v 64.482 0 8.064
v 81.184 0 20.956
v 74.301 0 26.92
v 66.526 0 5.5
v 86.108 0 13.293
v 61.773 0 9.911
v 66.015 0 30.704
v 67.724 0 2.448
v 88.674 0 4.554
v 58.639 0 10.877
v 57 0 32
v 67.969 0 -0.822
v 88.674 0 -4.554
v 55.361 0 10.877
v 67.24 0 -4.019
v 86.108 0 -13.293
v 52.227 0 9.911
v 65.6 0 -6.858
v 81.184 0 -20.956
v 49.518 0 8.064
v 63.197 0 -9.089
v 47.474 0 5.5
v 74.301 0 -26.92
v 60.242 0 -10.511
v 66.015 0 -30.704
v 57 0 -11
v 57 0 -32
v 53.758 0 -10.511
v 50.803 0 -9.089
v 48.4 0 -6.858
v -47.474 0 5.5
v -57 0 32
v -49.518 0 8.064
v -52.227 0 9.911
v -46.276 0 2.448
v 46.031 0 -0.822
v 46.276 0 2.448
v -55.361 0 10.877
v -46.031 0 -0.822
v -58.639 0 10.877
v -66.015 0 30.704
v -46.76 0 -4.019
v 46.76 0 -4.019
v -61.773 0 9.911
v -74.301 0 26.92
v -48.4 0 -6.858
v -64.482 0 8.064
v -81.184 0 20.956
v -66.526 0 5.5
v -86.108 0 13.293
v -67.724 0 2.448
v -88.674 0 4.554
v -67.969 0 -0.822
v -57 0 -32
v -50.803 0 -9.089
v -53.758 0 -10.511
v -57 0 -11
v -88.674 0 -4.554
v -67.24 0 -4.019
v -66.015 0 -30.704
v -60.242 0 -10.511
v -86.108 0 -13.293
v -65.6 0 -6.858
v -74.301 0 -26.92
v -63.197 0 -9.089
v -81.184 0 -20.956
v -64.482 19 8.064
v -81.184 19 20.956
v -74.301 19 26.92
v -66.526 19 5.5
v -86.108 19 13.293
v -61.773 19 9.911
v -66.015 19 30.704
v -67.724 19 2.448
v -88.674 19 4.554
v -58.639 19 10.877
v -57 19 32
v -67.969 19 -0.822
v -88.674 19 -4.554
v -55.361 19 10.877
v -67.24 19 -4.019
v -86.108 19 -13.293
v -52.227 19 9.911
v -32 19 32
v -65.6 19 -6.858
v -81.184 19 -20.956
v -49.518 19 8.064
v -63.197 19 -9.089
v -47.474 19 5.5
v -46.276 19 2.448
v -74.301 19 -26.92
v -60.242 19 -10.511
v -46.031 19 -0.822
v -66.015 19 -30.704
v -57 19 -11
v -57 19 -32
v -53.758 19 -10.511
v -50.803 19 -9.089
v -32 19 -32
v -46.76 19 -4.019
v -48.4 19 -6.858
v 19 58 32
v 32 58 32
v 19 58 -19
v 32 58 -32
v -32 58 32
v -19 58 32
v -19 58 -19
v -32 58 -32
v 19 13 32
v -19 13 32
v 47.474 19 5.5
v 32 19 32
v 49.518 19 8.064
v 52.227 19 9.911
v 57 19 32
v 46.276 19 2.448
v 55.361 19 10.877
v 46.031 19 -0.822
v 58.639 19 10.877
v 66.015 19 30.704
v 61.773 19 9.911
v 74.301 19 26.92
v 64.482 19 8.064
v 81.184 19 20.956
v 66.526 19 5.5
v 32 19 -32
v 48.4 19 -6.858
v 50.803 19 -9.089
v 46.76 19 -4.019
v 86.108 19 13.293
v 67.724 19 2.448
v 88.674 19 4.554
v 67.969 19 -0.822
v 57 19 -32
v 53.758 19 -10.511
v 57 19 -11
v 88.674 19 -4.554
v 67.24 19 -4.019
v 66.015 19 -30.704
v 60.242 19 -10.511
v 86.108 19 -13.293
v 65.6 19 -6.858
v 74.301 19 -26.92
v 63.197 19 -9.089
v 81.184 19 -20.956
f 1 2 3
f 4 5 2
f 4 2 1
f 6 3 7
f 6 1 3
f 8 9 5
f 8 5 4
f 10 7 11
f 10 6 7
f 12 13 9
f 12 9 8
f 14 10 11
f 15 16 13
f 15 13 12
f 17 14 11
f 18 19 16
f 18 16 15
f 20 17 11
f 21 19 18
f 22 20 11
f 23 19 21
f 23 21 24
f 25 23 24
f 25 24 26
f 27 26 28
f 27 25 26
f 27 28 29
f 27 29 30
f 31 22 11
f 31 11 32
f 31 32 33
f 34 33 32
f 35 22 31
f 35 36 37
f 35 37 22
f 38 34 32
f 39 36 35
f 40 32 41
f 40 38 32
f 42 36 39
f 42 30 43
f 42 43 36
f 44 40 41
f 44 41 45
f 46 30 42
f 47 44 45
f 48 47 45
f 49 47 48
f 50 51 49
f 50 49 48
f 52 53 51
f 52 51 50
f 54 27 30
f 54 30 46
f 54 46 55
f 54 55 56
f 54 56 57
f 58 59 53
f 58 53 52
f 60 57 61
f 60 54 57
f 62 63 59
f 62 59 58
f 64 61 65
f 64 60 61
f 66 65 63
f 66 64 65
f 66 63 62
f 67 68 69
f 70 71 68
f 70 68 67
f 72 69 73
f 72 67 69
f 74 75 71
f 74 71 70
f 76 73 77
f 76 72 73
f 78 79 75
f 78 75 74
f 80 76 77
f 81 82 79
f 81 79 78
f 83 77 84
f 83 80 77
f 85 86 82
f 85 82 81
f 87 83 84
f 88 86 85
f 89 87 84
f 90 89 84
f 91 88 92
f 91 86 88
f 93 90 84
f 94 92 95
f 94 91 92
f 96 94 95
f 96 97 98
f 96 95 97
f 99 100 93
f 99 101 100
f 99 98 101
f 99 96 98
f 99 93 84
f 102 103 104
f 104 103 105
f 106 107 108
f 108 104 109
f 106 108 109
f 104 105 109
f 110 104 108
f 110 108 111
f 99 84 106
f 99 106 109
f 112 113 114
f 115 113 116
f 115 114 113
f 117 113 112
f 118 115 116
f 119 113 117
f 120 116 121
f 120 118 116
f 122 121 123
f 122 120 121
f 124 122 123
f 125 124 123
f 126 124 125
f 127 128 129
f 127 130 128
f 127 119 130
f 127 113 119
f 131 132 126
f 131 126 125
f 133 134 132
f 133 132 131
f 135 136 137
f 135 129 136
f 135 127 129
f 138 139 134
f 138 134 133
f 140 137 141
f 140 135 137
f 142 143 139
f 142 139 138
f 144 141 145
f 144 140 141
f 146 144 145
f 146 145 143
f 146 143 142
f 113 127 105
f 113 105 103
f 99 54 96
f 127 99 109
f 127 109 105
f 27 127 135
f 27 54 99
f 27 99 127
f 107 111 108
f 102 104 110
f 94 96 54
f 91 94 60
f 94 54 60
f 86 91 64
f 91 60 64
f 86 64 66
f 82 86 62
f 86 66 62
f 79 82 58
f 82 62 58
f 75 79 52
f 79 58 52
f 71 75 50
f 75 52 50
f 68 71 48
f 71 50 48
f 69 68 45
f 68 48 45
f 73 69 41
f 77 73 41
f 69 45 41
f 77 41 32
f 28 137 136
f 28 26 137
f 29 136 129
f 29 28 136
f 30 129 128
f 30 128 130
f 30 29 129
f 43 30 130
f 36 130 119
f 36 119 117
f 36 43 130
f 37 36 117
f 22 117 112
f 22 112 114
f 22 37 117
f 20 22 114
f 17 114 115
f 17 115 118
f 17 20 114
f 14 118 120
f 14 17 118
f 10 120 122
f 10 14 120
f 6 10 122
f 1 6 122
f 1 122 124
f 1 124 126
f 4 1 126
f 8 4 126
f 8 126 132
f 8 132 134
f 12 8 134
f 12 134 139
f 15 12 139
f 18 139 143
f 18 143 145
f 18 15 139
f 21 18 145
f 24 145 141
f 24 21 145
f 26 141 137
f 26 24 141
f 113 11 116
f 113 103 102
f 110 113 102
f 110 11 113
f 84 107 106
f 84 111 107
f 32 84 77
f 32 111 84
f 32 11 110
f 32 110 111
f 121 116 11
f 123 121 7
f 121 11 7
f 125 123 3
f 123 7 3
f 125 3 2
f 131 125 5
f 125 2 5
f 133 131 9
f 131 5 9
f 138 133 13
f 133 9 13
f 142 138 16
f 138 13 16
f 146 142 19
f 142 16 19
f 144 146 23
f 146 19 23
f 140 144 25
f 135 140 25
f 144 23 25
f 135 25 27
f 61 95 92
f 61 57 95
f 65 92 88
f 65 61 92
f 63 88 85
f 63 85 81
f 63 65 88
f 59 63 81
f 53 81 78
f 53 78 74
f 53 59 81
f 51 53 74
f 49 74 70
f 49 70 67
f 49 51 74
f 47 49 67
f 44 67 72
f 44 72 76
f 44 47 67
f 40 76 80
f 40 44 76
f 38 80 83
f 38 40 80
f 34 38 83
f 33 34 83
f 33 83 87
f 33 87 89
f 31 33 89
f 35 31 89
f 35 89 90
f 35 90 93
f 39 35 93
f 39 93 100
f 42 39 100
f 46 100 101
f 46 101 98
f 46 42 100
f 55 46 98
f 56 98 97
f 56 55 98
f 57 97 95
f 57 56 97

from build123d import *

# Parameters (mm, degrees)
SKETCH1_R               = 11
BOSS_EXTRUDE1_DEPTH     = 13
SKETCH2_W               = 38
SKETCH2_H               = 51
BOSS_EXTRUDE3_DEPTH     = 45
CUT_EXTRUDE1_DEPTH      = 127.696487718
CUT_EXTRUDE1_DEPTH_BACK = 127.696487718
SKETCH4_R               = 11
BOSS_EXTRUDE4_DEPTH     = 6
BOSS_EXTRUDE5_DEPTH     = 39


with BuildPart() as part:
    # Sketch1 → Boss-Extrude1 (new body)
    with BuildSketch(Plane(origin=(0, 0, 0), x_dir=(1, 0, 0), z_dir=(0, 1, 0))):
        with BuildLine():
            Line((-57, 32), (57, 32))
            ThreePointArc((57, 32), (89, 0), (57, -32))
            Line((57, -32), (-57, -32))
            ThreePointArc((-57, -32), (-89, 0), (-57, 32))
        make_face()
        with Locations(Location((-57, 0, 0), (0, 0, 90))):
            Circle(SKETCH1_R, mode=Mode.SUBTRACT)
        with Locations(Location((57, 0, 0), (0, 0, 90))):
            Circle(SKETCH1_R, mode=Mode.SUBTRACT)
    extrude(amount=BOSS_EXTRUDE1_DEPTH)

    # Sketch2 → Boss-Extrude3 (add)
    with BuildSketch(Plane(origin=(0, 13, 0), x_dir=(1, 0, 0), z_dir=(0, 1, 0))):
        with Locations((0, -6.5)):
            Rectangle(SKETCH2_W, SKETCH2_H)
    extrude(amount=BOSS_EXTRUDE3_DEPTH)

    # Sketch3 → Cut-Extrude1 (cut, two sides: drawn at the far end of the back side and taken through both)
    with BuildSketch(Plane.ZY.offset(19).offset(-CUT_EXTRUDE1_DEPTH_BACK)):
        Polygon((-143.828237157, 168.142562197), (-19, 58), (32, 13), (156.828237157, -97.142562197), (377.113361551, 152.513912116), (76.456887238, 417.799036511), align=None)
    extrude(amount=CUT_EXTRUDE1_DEPTH + CUT_EXTRUDE1_DEPTH_BACK, mode=Mode.SUBTRACT)

    # Sketch4 → Boss-Extrude4 (add)
    with BuildSketch(Plane(origin=(0, 13, 0), x_dir=(1, 0, 0), z_dir=(0, 1, 0))):
        with BuildLine():
            ThreePointArc((-57, 32), (-89, 0), (-57, -32))
            Line((-57, -32), (-19, -32))
            Line((-19, -32), (-19, 19))
            Line((-19, 19), (19, 19))
            Line((19, 19), (19, -32))
            Line((19, -32), (57, -32))
            ThreePointArc((57, -32), (89, 0), (57, 32))
            Line((57, 32), (-57, 32))
        make_face()
        with Locations(Location((-57, 0, 0), (0, 0, 90))):
            Circle(SKETCH4_R, mode=Mode.SUBTRACT)
        with Locations(Location((57, 0, 0), (0, 0, 90))):
            Circle(SKETCH4_R, mode=Mode.SUBTRACT)
    extrude(amount=BOSS_EXTRUDE4_DEPTH)

    # Sketch5 → Boss-Extrude5 (add)
    with BuildSketch(Plane(origin=(0, 19, 0), x_dir=(1, 0, 0), z_dir=(0, 1, 0))):
        Polygon((-32, 32), (32, 32), (32, -32), (19, -32), (19, -25.2), (19, 19), (-19, 19), (-19, -25.2), (-19, -32), (-32, -32), align=None)
    extrude(amount=BOSS_EXTRUDE5_DEPTH)


solid = part.part
